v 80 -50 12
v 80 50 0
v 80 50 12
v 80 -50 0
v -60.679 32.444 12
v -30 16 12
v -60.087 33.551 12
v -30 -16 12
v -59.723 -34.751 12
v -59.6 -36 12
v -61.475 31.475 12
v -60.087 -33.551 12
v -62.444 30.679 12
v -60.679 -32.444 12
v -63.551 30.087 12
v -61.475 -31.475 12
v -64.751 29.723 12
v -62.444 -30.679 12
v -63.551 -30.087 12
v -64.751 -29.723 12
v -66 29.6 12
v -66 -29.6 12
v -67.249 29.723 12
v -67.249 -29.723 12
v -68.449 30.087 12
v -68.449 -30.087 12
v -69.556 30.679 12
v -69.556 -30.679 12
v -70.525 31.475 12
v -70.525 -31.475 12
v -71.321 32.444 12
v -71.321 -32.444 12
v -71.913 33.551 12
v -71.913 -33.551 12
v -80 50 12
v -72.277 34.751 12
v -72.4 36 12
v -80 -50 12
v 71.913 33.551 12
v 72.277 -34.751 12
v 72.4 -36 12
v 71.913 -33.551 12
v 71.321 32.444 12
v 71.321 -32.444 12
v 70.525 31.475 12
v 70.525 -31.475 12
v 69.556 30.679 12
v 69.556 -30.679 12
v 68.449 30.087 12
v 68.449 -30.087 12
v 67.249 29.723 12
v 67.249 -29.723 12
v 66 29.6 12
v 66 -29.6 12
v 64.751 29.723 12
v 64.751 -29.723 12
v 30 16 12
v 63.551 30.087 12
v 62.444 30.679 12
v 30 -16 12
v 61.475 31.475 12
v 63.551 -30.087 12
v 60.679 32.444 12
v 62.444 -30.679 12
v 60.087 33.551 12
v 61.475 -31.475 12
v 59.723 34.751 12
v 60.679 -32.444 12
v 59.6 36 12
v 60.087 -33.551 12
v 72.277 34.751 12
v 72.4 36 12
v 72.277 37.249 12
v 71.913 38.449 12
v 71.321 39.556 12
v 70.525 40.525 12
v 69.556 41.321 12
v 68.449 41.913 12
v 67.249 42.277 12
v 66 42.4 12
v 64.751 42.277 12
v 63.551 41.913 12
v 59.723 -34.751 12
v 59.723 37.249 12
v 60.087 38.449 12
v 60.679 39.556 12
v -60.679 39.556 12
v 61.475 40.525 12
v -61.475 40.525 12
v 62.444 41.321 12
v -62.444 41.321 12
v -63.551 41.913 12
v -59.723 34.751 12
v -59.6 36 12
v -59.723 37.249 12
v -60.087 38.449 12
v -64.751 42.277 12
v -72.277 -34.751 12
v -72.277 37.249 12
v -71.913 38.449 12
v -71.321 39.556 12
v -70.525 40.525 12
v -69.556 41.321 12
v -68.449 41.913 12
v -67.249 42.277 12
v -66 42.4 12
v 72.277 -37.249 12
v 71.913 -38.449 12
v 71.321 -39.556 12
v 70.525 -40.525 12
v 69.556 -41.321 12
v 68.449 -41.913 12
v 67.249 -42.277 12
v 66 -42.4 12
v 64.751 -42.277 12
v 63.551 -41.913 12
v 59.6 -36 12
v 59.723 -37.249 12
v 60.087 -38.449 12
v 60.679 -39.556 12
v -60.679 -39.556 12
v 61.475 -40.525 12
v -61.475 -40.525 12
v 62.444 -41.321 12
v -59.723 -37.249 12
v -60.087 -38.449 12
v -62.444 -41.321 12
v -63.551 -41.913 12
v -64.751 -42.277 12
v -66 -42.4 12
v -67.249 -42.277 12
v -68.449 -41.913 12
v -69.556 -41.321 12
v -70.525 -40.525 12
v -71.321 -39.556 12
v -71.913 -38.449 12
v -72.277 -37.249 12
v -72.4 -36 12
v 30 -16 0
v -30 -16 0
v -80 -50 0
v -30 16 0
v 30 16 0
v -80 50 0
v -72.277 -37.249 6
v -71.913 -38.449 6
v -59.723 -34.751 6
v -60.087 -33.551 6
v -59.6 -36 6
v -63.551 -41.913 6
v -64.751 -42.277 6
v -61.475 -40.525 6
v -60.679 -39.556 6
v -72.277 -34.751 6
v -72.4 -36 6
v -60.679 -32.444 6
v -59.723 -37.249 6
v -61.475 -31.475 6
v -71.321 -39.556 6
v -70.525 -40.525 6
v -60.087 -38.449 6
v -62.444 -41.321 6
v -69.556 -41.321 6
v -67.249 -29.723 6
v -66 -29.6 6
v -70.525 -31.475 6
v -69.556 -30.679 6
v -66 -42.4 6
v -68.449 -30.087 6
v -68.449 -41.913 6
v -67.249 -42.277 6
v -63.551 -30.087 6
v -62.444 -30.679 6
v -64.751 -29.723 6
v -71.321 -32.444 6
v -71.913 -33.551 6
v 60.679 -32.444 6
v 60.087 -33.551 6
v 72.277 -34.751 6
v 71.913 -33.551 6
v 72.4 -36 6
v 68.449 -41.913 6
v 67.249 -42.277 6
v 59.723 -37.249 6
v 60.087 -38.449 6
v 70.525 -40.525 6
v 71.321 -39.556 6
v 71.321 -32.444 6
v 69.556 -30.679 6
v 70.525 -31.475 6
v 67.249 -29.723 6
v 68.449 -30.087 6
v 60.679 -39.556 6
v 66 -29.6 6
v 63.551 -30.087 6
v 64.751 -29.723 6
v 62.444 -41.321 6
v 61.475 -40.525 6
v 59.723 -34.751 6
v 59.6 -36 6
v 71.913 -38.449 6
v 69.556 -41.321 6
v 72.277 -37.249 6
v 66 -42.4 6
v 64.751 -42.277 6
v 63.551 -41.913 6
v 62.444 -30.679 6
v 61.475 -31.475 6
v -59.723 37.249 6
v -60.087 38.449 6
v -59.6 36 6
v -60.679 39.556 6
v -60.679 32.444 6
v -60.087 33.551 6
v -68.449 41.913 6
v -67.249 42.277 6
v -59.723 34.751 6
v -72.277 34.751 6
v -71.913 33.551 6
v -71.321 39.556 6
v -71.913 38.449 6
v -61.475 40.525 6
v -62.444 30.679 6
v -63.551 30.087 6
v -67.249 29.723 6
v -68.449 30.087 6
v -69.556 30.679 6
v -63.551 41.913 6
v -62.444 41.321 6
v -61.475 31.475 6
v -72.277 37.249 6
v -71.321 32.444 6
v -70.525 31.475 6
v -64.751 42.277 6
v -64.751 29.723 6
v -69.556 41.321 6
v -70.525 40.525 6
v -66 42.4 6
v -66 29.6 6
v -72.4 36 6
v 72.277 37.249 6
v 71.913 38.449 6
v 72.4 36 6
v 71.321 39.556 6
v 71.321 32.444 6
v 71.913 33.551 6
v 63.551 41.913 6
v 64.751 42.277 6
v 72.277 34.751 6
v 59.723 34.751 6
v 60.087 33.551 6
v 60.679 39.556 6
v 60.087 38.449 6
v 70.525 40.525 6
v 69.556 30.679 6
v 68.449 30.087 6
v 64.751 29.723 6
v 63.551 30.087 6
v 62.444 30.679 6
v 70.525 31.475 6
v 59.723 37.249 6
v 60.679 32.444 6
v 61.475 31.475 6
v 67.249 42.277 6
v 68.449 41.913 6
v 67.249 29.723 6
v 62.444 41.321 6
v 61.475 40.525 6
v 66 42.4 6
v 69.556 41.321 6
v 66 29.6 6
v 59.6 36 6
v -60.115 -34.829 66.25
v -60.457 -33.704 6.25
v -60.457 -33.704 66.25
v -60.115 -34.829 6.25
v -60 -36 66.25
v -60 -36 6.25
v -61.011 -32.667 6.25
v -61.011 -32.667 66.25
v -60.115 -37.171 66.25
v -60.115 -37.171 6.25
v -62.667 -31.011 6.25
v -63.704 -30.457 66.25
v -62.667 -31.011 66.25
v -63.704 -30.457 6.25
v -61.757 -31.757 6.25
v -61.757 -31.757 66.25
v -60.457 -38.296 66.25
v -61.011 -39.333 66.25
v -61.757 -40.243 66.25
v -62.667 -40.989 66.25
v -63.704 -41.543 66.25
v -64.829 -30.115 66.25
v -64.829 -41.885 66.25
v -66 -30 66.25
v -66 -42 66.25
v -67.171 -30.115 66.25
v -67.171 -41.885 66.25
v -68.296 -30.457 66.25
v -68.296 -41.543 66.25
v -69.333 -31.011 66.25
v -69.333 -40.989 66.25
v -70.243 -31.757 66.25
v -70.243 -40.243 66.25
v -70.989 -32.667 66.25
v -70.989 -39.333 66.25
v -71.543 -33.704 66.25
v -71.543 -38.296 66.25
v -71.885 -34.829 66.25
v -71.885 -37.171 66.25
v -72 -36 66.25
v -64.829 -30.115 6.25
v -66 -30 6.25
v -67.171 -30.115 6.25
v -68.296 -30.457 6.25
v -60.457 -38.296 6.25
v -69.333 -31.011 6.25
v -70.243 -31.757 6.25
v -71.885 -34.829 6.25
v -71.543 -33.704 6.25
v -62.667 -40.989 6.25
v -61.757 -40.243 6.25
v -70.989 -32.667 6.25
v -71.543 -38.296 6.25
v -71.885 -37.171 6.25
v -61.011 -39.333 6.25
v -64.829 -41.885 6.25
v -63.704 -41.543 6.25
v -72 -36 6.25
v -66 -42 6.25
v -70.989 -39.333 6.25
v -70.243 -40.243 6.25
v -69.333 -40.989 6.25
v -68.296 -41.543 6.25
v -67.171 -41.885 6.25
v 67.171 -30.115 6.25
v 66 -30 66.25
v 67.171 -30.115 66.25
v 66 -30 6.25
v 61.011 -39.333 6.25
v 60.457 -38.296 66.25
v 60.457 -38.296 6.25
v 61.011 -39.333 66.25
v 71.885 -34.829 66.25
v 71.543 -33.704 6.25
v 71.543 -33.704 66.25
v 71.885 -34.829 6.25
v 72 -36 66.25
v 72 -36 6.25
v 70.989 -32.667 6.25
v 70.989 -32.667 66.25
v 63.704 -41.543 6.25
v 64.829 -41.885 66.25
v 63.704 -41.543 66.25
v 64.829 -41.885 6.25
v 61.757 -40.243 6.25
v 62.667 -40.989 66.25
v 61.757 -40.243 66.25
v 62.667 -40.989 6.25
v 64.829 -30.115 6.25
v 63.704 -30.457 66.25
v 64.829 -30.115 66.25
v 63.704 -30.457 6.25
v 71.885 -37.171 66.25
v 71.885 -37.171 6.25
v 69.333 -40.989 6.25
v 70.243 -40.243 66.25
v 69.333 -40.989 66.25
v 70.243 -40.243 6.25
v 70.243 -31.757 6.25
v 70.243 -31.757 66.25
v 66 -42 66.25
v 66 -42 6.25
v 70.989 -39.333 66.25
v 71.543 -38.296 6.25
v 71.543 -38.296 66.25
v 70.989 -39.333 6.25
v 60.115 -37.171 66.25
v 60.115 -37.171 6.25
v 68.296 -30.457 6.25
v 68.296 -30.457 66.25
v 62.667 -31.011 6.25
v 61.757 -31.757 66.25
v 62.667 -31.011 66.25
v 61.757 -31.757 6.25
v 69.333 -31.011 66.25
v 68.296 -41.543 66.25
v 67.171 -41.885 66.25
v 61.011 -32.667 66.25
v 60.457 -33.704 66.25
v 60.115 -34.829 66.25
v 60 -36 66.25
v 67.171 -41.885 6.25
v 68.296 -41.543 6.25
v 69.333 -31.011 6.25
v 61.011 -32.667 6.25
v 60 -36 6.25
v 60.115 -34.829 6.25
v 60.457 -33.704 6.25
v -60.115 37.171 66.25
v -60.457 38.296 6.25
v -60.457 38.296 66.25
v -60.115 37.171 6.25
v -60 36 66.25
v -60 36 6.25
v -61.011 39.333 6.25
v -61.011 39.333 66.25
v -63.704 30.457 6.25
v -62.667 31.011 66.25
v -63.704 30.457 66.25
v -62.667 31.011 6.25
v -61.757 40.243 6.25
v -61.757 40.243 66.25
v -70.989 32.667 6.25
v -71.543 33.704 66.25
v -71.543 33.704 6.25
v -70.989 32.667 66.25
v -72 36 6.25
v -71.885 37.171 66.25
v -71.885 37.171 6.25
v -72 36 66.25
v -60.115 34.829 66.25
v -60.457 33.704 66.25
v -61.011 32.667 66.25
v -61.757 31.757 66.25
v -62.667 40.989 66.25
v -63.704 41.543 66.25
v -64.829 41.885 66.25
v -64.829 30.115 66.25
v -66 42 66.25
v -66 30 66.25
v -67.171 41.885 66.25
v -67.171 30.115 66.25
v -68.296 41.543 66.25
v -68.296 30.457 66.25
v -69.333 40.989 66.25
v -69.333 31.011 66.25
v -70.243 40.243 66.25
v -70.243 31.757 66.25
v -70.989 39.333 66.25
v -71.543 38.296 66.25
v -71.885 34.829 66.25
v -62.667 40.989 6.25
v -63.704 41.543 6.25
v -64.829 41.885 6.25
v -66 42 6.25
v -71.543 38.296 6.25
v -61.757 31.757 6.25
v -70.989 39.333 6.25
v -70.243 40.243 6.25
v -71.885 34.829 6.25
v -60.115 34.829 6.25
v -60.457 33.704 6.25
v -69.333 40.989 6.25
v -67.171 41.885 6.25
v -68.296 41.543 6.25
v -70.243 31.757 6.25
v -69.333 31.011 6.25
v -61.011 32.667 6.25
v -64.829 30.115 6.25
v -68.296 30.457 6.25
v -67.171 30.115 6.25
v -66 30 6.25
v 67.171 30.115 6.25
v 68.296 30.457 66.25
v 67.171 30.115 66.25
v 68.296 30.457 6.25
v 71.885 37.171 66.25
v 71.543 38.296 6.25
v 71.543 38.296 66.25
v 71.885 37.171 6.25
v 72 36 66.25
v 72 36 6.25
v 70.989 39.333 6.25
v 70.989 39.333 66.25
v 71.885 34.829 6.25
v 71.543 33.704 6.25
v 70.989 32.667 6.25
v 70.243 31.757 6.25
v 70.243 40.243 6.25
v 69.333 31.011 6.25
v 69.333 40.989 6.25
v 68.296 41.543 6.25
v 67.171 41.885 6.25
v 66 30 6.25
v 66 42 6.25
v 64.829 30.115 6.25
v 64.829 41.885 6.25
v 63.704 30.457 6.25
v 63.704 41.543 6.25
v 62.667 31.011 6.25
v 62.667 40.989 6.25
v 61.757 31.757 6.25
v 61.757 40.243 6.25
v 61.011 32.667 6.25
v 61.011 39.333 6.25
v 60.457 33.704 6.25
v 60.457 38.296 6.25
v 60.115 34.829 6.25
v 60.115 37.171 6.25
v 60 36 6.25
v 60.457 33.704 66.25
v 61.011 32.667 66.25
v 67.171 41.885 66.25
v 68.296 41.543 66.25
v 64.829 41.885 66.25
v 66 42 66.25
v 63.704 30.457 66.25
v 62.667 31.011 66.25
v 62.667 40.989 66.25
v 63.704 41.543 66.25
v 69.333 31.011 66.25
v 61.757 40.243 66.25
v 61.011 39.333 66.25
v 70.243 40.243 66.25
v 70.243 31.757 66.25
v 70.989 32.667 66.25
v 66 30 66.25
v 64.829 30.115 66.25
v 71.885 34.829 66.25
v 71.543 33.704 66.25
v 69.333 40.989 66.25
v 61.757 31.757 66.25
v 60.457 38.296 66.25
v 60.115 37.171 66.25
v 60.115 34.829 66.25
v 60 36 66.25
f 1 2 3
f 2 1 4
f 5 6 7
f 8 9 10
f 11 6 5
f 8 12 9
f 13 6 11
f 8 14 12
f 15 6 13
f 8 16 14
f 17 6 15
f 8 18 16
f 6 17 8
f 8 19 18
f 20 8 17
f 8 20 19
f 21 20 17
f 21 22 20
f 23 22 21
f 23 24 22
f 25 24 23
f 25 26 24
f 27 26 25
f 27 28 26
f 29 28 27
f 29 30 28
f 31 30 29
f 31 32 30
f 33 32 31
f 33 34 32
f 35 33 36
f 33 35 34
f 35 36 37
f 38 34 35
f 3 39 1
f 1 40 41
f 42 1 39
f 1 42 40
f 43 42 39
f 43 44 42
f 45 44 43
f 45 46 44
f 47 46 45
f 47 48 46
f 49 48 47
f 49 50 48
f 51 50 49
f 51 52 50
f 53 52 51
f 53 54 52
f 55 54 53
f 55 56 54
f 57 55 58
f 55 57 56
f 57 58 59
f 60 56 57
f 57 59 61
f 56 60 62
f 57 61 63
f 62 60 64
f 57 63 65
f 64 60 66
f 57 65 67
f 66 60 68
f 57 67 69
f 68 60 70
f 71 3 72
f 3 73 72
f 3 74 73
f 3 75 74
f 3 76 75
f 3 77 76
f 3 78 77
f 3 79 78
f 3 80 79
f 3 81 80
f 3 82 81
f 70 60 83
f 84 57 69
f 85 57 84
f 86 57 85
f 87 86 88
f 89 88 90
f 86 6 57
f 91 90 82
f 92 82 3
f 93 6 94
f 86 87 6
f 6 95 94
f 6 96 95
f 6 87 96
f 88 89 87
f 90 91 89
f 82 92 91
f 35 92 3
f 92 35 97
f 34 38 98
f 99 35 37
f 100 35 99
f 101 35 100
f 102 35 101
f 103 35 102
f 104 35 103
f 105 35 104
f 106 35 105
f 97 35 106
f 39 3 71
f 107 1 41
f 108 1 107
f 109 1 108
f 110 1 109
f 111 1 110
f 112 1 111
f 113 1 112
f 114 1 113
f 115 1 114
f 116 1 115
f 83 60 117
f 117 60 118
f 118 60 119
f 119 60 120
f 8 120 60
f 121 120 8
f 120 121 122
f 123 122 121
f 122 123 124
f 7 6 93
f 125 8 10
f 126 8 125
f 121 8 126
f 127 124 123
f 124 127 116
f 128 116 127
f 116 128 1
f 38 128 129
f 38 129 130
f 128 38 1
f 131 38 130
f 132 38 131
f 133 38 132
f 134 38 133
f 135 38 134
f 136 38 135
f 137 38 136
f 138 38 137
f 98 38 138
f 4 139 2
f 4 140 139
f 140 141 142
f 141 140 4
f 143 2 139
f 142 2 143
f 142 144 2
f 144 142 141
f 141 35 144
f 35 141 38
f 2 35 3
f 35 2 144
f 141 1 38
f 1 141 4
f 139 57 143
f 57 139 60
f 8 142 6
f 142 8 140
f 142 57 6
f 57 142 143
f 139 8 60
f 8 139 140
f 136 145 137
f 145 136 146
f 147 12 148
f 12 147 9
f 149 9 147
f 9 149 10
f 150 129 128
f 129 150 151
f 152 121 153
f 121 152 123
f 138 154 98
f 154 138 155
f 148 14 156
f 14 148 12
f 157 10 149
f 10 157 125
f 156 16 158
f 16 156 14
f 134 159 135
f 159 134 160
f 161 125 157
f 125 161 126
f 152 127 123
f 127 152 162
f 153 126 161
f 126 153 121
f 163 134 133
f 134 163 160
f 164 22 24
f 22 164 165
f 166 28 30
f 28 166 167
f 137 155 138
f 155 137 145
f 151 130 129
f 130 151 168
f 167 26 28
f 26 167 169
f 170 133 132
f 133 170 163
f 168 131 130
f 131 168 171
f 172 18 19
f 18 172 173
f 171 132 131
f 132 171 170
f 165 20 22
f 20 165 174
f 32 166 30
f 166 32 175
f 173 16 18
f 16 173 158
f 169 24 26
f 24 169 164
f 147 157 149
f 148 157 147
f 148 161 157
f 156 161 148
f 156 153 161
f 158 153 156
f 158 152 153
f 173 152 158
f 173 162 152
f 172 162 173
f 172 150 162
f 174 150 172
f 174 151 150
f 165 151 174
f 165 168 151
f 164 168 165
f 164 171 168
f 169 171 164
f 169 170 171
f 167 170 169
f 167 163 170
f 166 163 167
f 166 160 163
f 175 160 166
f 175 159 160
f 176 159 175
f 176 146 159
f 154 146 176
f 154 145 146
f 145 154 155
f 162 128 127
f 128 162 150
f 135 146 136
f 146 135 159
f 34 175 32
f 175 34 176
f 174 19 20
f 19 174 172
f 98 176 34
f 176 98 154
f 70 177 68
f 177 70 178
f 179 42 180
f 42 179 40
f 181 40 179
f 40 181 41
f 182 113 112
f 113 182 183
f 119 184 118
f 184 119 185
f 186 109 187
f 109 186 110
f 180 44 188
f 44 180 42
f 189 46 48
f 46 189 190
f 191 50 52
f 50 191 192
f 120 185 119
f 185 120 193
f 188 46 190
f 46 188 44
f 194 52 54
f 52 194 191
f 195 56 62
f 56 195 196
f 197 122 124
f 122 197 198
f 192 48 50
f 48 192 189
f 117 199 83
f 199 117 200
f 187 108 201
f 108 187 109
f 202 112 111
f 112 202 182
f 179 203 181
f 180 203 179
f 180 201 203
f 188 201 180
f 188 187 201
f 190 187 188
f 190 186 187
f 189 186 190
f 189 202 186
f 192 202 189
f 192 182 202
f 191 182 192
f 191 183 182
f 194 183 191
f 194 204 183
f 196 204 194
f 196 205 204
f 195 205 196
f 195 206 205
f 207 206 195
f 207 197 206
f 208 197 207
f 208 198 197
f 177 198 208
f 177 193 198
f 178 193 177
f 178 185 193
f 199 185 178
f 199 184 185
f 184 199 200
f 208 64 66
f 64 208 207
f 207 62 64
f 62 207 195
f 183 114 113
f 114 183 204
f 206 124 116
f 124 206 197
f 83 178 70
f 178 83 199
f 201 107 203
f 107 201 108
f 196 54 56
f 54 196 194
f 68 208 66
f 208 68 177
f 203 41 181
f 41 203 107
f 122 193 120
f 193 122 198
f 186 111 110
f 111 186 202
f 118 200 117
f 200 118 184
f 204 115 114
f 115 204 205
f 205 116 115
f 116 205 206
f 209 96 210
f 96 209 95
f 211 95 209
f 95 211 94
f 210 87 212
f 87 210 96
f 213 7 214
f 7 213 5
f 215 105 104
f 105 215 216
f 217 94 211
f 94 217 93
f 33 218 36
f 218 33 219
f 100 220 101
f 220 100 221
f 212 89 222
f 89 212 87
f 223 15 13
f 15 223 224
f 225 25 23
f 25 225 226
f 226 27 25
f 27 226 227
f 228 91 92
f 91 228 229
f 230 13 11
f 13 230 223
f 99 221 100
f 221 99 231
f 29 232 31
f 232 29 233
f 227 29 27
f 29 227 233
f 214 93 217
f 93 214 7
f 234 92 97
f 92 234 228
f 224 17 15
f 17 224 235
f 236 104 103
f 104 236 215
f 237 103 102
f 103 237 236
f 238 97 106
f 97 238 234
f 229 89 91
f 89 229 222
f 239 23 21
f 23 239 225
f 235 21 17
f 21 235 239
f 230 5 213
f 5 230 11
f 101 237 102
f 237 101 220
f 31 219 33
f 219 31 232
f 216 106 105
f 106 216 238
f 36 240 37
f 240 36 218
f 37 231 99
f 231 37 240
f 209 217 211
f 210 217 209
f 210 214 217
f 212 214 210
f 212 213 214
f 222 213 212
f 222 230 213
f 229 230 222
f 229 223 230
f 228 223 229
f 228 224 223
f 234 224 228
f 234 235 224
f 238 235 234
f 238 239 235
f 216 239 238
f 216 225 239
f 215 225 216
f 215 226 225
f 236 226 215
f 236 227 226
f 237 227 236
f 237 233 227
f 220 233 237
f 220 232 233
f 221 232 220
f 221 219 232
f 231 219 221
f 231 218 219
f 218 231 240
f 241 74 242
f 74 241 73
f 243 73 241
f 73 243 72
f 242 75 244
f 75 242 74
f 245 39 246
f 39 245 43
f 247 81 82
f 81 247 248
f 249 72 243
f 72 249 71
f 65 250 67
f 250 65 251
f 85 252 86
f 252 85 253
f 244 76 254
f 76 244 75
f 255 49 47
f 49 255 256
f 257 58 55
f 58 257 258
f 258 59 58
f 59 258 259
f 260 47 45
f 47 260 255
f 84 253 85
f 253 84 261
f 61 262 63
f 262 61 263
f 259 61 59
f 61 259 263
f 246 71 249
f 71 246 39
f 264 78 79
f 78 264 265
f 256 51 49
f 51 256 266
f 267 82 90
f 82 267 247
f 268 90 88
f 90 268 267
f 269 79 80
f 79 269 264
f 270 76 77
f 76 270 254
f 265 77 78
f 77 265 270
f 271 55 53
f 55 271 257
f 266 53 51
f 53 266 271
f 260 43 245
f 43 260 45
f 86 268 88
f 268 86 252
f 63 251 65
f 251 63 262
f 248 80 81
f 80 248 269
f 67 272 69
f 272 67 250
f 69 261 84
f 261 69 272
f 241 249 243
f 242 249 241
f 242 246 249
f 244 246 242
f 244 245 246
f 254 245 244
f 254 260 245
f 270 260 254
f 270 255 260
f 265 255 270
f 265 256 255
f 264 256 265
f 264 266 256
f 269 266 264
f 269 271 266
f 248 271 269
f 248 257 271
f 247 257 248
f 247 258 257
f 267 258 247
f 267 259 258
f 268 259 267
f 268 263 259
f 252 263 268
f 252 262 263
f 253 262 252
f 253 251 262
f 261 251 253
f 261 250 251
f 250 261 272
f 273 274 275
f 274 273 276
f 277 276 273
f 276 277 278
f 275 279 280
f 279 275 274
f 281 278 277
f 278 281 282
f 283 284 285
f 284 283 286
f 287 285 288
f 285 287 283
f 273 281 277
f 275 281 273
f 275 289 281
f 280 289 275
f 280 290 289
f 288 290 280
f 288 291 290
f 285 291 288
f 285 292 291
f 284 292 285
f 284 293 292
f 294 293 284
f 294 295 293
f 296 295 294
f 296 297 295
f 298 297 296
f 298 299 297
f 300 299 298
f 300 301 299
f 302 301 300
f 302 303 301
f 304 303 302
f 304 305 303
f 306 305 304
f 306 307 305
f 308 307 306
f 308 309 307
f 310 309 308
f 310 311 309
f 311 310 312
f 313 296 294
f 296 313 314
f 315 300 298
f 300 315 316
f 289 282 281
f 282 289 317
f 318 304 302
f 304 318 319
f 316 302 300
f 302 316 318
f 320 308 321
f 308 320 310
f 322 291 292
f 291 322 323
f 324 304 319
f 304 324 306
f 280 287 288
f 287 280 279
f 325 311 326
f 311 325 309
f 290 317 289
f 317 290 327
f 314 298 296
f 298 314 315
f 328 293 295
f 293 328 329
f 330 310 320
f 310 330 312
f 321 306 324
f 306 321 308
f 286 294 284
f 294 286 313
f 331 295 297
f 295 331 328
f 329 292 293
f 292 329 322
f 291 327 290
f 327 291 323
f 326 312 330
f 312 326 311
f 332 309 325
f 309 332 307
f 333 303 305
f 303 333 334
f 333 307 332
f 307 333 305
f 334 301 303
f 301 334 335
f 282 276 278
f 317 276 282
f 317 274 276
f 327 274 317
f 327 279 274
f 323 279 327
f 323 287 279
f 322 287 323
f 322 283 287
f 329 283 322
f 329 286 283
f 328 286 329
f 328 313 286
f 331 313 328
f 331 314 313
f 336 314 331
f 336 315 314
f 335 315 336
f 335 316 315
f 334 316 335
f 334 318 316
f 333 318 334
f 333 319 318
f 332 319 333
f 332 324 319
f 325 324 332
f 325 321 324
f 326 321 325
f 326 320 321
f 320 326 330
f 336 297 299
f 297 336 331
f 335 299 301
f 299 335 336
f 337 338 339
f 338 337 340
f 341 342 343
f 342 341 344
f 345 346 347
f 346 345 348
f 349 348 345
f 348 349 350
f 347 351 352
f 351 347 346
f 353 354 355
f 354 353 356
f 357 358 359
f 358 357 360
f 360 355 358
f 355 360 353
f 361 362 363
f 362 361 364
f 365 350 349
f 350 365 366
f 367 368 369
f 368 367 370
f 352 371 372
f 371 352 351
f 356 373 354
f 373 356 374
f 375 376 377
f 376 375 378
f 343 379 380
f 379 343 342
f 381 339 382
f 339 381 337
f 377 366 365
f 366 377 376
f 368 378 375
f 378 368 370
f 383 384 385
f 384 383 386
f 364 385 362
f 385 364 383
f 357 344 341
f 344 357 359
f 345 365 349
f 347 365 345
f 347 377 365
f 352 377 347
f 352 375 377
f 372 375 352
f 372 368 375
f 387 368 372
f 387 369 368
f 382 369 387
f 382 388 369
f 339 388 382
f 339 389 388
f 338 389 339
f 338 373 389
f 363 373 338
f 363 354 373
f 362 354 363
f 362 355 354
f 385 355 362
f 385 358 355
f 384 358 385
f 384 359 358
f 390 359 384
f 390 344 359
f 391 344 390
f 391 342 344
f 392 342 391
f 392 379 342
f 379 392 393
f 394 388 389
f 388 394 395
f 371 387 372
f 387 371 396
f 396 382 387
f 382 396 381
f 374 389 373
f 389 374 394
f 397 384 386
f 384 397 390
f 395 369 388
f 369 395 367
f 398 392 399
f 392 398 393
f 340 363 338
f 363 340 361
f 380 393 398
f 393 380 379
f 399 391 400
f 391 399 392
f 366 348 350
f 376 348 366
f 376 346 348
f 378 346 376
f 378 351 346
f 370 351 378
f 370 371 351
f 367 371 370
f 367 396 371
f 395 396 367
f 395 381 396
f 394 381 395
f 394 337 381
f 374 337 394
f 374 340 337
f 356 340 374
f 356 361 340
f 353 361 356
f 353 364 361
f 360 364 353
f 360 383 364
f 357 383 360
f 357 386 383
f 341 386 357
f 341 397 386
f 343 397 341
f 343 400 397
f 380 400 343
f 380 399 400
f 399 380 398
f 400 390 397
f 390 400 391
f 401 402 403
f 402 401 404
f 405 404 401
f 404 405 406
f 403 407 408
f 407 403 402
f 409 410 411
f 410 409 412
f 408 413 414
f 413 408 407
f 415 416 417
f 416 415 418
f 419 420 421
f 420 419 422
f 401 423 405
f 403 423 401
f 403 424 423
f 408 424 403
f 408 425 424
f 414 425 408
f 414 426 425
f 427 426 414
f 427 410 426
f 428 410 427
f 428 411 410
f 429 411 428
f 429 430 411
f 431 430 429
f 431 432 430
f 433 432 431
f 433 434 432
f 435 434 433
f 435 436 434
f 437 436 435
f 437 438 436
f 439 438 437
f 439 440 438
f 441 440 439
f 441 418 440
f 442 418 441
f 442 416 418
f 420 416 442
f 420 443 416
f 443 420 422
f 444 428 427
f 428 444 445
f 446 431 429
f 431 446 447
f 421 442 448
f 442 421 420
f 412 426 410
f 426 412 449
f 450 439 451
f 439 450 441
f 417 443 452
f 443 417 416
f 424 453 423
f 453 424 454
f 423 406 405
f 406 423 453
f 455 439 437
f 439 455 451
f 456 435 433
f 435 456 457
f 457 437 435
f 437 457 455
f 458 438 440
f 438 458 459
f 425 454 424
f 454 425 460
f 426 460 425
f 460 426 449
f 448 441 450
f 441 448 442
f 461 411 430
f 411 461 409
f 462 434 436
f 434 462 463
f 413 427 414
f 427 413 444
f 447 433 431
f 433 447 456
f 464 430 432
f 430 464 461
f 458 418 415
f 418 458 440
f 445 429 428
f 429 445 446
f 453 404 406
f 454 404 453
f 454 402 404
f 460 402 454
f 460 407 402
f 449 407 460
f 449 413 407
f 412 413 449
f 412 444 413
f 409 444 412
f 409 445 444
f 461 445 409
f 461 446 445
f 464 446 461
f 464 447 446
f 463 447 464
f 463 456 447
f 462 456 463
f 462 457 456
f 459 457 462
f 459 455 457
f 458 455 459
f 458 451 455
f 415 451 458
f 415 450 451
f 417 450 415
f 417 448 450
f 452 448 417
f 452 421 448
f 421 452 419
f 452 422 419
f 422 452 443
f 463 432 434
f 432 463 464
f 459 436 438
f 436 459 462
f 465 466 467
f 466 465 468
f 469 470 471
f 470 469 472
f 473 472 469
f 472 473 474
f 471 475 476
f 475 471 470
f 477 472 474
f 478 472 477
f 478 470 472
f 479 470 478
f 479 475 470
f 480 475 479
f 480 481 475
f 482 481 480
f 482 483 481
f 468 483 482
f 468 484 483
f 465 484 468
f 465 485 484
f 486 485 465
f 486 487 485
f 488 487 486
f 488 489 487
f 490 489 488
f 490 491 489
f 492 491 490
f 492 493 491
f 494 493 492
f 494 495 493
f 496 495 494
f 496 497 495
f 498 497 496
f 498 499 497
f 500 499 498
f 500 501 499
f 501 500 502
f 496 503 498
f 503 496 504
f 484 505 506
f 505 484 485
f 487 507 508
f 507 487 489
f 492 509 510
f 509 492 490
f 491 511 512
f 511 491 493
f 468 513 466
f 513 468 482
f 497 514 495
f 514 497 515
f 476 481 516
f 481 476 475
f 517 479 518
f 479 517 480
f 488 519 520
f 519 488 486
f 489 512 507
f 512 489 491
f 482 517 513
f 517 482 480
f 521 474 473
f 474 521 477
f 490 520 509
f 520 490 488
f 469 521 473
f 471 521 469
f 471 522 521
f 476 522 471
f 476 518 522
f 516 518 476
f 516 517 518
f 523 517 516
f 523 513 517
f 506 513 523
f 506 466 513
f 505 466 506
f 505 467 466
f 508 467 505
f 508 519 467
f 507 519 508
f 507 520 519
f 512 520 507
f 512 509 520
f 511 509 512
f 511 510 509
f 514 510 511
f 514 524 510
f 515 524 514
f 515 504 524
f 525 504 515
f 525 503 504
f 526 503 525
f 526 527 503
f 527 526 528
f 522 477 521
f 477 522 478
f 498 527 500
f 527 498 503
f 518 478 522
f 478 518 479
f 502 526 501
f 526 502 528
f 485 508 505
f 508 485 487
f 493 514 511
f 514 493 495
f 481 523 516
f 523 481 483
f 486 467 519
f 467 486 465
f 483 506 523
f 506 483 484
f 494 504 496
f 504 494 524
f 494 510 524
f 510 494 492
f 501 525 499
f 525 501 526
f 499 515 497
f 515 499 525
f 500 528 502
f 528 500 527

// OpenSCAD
$fn = 32;

// ------------------------------------------------------------------------
// Frame with four posts: 160 x 100 mm frame, four d12 posts
// Every part is its own module, assembly() places them once.
// ------------------------------------------------------------------------

// --- part 1 ---
module base_frame() {
  difference() {
    translate([-80, -50, 0]) cube([160, 100, 12]);
    translate([-30, -16, -1]) cube([60, 32, 14]);
    translate([-66, -36, 6]) cylinder(h = 7, d = 12.8);
    translate([66, -36, 6]) cylinder(h = 7, d = 12.8);
    translate([-66, 36, 6]) cylinder(h = 7, d = 12.8);
    translate([66, 36, 6]) cylinder(h = 7, d = 12.8);
  }
}

// --- part 2 ---
module post1() {
  cylinder(h = 60, d = 12);
}

// --- part 3 ---
module post2() {
  cylinder(h = 60, d = 12);
}

// --- part 4 ---
module post3() {
  cylinder(h = 60, d = 12);
}

// --- part 5 ---
module post4() {
  cylinder(h = 60, d = 12);
}

// --- assembly ---
module assembly() {
  translate([0, 0, 0]) rotate([0, 0, 0]) base_frame();
  translate([-66, -36, 6.25]) rotate([0, 0, 0]) post1();
  translate([66, -36, 6.25]) rotate([0, 0, 0]) post2();
  translate([-66, 36, 6.25]) rotate([0, 0, 0]) post3();
  translate([66, 36, 6.25]) rotate([0, 0, 0]) post4();
}

assembly();
